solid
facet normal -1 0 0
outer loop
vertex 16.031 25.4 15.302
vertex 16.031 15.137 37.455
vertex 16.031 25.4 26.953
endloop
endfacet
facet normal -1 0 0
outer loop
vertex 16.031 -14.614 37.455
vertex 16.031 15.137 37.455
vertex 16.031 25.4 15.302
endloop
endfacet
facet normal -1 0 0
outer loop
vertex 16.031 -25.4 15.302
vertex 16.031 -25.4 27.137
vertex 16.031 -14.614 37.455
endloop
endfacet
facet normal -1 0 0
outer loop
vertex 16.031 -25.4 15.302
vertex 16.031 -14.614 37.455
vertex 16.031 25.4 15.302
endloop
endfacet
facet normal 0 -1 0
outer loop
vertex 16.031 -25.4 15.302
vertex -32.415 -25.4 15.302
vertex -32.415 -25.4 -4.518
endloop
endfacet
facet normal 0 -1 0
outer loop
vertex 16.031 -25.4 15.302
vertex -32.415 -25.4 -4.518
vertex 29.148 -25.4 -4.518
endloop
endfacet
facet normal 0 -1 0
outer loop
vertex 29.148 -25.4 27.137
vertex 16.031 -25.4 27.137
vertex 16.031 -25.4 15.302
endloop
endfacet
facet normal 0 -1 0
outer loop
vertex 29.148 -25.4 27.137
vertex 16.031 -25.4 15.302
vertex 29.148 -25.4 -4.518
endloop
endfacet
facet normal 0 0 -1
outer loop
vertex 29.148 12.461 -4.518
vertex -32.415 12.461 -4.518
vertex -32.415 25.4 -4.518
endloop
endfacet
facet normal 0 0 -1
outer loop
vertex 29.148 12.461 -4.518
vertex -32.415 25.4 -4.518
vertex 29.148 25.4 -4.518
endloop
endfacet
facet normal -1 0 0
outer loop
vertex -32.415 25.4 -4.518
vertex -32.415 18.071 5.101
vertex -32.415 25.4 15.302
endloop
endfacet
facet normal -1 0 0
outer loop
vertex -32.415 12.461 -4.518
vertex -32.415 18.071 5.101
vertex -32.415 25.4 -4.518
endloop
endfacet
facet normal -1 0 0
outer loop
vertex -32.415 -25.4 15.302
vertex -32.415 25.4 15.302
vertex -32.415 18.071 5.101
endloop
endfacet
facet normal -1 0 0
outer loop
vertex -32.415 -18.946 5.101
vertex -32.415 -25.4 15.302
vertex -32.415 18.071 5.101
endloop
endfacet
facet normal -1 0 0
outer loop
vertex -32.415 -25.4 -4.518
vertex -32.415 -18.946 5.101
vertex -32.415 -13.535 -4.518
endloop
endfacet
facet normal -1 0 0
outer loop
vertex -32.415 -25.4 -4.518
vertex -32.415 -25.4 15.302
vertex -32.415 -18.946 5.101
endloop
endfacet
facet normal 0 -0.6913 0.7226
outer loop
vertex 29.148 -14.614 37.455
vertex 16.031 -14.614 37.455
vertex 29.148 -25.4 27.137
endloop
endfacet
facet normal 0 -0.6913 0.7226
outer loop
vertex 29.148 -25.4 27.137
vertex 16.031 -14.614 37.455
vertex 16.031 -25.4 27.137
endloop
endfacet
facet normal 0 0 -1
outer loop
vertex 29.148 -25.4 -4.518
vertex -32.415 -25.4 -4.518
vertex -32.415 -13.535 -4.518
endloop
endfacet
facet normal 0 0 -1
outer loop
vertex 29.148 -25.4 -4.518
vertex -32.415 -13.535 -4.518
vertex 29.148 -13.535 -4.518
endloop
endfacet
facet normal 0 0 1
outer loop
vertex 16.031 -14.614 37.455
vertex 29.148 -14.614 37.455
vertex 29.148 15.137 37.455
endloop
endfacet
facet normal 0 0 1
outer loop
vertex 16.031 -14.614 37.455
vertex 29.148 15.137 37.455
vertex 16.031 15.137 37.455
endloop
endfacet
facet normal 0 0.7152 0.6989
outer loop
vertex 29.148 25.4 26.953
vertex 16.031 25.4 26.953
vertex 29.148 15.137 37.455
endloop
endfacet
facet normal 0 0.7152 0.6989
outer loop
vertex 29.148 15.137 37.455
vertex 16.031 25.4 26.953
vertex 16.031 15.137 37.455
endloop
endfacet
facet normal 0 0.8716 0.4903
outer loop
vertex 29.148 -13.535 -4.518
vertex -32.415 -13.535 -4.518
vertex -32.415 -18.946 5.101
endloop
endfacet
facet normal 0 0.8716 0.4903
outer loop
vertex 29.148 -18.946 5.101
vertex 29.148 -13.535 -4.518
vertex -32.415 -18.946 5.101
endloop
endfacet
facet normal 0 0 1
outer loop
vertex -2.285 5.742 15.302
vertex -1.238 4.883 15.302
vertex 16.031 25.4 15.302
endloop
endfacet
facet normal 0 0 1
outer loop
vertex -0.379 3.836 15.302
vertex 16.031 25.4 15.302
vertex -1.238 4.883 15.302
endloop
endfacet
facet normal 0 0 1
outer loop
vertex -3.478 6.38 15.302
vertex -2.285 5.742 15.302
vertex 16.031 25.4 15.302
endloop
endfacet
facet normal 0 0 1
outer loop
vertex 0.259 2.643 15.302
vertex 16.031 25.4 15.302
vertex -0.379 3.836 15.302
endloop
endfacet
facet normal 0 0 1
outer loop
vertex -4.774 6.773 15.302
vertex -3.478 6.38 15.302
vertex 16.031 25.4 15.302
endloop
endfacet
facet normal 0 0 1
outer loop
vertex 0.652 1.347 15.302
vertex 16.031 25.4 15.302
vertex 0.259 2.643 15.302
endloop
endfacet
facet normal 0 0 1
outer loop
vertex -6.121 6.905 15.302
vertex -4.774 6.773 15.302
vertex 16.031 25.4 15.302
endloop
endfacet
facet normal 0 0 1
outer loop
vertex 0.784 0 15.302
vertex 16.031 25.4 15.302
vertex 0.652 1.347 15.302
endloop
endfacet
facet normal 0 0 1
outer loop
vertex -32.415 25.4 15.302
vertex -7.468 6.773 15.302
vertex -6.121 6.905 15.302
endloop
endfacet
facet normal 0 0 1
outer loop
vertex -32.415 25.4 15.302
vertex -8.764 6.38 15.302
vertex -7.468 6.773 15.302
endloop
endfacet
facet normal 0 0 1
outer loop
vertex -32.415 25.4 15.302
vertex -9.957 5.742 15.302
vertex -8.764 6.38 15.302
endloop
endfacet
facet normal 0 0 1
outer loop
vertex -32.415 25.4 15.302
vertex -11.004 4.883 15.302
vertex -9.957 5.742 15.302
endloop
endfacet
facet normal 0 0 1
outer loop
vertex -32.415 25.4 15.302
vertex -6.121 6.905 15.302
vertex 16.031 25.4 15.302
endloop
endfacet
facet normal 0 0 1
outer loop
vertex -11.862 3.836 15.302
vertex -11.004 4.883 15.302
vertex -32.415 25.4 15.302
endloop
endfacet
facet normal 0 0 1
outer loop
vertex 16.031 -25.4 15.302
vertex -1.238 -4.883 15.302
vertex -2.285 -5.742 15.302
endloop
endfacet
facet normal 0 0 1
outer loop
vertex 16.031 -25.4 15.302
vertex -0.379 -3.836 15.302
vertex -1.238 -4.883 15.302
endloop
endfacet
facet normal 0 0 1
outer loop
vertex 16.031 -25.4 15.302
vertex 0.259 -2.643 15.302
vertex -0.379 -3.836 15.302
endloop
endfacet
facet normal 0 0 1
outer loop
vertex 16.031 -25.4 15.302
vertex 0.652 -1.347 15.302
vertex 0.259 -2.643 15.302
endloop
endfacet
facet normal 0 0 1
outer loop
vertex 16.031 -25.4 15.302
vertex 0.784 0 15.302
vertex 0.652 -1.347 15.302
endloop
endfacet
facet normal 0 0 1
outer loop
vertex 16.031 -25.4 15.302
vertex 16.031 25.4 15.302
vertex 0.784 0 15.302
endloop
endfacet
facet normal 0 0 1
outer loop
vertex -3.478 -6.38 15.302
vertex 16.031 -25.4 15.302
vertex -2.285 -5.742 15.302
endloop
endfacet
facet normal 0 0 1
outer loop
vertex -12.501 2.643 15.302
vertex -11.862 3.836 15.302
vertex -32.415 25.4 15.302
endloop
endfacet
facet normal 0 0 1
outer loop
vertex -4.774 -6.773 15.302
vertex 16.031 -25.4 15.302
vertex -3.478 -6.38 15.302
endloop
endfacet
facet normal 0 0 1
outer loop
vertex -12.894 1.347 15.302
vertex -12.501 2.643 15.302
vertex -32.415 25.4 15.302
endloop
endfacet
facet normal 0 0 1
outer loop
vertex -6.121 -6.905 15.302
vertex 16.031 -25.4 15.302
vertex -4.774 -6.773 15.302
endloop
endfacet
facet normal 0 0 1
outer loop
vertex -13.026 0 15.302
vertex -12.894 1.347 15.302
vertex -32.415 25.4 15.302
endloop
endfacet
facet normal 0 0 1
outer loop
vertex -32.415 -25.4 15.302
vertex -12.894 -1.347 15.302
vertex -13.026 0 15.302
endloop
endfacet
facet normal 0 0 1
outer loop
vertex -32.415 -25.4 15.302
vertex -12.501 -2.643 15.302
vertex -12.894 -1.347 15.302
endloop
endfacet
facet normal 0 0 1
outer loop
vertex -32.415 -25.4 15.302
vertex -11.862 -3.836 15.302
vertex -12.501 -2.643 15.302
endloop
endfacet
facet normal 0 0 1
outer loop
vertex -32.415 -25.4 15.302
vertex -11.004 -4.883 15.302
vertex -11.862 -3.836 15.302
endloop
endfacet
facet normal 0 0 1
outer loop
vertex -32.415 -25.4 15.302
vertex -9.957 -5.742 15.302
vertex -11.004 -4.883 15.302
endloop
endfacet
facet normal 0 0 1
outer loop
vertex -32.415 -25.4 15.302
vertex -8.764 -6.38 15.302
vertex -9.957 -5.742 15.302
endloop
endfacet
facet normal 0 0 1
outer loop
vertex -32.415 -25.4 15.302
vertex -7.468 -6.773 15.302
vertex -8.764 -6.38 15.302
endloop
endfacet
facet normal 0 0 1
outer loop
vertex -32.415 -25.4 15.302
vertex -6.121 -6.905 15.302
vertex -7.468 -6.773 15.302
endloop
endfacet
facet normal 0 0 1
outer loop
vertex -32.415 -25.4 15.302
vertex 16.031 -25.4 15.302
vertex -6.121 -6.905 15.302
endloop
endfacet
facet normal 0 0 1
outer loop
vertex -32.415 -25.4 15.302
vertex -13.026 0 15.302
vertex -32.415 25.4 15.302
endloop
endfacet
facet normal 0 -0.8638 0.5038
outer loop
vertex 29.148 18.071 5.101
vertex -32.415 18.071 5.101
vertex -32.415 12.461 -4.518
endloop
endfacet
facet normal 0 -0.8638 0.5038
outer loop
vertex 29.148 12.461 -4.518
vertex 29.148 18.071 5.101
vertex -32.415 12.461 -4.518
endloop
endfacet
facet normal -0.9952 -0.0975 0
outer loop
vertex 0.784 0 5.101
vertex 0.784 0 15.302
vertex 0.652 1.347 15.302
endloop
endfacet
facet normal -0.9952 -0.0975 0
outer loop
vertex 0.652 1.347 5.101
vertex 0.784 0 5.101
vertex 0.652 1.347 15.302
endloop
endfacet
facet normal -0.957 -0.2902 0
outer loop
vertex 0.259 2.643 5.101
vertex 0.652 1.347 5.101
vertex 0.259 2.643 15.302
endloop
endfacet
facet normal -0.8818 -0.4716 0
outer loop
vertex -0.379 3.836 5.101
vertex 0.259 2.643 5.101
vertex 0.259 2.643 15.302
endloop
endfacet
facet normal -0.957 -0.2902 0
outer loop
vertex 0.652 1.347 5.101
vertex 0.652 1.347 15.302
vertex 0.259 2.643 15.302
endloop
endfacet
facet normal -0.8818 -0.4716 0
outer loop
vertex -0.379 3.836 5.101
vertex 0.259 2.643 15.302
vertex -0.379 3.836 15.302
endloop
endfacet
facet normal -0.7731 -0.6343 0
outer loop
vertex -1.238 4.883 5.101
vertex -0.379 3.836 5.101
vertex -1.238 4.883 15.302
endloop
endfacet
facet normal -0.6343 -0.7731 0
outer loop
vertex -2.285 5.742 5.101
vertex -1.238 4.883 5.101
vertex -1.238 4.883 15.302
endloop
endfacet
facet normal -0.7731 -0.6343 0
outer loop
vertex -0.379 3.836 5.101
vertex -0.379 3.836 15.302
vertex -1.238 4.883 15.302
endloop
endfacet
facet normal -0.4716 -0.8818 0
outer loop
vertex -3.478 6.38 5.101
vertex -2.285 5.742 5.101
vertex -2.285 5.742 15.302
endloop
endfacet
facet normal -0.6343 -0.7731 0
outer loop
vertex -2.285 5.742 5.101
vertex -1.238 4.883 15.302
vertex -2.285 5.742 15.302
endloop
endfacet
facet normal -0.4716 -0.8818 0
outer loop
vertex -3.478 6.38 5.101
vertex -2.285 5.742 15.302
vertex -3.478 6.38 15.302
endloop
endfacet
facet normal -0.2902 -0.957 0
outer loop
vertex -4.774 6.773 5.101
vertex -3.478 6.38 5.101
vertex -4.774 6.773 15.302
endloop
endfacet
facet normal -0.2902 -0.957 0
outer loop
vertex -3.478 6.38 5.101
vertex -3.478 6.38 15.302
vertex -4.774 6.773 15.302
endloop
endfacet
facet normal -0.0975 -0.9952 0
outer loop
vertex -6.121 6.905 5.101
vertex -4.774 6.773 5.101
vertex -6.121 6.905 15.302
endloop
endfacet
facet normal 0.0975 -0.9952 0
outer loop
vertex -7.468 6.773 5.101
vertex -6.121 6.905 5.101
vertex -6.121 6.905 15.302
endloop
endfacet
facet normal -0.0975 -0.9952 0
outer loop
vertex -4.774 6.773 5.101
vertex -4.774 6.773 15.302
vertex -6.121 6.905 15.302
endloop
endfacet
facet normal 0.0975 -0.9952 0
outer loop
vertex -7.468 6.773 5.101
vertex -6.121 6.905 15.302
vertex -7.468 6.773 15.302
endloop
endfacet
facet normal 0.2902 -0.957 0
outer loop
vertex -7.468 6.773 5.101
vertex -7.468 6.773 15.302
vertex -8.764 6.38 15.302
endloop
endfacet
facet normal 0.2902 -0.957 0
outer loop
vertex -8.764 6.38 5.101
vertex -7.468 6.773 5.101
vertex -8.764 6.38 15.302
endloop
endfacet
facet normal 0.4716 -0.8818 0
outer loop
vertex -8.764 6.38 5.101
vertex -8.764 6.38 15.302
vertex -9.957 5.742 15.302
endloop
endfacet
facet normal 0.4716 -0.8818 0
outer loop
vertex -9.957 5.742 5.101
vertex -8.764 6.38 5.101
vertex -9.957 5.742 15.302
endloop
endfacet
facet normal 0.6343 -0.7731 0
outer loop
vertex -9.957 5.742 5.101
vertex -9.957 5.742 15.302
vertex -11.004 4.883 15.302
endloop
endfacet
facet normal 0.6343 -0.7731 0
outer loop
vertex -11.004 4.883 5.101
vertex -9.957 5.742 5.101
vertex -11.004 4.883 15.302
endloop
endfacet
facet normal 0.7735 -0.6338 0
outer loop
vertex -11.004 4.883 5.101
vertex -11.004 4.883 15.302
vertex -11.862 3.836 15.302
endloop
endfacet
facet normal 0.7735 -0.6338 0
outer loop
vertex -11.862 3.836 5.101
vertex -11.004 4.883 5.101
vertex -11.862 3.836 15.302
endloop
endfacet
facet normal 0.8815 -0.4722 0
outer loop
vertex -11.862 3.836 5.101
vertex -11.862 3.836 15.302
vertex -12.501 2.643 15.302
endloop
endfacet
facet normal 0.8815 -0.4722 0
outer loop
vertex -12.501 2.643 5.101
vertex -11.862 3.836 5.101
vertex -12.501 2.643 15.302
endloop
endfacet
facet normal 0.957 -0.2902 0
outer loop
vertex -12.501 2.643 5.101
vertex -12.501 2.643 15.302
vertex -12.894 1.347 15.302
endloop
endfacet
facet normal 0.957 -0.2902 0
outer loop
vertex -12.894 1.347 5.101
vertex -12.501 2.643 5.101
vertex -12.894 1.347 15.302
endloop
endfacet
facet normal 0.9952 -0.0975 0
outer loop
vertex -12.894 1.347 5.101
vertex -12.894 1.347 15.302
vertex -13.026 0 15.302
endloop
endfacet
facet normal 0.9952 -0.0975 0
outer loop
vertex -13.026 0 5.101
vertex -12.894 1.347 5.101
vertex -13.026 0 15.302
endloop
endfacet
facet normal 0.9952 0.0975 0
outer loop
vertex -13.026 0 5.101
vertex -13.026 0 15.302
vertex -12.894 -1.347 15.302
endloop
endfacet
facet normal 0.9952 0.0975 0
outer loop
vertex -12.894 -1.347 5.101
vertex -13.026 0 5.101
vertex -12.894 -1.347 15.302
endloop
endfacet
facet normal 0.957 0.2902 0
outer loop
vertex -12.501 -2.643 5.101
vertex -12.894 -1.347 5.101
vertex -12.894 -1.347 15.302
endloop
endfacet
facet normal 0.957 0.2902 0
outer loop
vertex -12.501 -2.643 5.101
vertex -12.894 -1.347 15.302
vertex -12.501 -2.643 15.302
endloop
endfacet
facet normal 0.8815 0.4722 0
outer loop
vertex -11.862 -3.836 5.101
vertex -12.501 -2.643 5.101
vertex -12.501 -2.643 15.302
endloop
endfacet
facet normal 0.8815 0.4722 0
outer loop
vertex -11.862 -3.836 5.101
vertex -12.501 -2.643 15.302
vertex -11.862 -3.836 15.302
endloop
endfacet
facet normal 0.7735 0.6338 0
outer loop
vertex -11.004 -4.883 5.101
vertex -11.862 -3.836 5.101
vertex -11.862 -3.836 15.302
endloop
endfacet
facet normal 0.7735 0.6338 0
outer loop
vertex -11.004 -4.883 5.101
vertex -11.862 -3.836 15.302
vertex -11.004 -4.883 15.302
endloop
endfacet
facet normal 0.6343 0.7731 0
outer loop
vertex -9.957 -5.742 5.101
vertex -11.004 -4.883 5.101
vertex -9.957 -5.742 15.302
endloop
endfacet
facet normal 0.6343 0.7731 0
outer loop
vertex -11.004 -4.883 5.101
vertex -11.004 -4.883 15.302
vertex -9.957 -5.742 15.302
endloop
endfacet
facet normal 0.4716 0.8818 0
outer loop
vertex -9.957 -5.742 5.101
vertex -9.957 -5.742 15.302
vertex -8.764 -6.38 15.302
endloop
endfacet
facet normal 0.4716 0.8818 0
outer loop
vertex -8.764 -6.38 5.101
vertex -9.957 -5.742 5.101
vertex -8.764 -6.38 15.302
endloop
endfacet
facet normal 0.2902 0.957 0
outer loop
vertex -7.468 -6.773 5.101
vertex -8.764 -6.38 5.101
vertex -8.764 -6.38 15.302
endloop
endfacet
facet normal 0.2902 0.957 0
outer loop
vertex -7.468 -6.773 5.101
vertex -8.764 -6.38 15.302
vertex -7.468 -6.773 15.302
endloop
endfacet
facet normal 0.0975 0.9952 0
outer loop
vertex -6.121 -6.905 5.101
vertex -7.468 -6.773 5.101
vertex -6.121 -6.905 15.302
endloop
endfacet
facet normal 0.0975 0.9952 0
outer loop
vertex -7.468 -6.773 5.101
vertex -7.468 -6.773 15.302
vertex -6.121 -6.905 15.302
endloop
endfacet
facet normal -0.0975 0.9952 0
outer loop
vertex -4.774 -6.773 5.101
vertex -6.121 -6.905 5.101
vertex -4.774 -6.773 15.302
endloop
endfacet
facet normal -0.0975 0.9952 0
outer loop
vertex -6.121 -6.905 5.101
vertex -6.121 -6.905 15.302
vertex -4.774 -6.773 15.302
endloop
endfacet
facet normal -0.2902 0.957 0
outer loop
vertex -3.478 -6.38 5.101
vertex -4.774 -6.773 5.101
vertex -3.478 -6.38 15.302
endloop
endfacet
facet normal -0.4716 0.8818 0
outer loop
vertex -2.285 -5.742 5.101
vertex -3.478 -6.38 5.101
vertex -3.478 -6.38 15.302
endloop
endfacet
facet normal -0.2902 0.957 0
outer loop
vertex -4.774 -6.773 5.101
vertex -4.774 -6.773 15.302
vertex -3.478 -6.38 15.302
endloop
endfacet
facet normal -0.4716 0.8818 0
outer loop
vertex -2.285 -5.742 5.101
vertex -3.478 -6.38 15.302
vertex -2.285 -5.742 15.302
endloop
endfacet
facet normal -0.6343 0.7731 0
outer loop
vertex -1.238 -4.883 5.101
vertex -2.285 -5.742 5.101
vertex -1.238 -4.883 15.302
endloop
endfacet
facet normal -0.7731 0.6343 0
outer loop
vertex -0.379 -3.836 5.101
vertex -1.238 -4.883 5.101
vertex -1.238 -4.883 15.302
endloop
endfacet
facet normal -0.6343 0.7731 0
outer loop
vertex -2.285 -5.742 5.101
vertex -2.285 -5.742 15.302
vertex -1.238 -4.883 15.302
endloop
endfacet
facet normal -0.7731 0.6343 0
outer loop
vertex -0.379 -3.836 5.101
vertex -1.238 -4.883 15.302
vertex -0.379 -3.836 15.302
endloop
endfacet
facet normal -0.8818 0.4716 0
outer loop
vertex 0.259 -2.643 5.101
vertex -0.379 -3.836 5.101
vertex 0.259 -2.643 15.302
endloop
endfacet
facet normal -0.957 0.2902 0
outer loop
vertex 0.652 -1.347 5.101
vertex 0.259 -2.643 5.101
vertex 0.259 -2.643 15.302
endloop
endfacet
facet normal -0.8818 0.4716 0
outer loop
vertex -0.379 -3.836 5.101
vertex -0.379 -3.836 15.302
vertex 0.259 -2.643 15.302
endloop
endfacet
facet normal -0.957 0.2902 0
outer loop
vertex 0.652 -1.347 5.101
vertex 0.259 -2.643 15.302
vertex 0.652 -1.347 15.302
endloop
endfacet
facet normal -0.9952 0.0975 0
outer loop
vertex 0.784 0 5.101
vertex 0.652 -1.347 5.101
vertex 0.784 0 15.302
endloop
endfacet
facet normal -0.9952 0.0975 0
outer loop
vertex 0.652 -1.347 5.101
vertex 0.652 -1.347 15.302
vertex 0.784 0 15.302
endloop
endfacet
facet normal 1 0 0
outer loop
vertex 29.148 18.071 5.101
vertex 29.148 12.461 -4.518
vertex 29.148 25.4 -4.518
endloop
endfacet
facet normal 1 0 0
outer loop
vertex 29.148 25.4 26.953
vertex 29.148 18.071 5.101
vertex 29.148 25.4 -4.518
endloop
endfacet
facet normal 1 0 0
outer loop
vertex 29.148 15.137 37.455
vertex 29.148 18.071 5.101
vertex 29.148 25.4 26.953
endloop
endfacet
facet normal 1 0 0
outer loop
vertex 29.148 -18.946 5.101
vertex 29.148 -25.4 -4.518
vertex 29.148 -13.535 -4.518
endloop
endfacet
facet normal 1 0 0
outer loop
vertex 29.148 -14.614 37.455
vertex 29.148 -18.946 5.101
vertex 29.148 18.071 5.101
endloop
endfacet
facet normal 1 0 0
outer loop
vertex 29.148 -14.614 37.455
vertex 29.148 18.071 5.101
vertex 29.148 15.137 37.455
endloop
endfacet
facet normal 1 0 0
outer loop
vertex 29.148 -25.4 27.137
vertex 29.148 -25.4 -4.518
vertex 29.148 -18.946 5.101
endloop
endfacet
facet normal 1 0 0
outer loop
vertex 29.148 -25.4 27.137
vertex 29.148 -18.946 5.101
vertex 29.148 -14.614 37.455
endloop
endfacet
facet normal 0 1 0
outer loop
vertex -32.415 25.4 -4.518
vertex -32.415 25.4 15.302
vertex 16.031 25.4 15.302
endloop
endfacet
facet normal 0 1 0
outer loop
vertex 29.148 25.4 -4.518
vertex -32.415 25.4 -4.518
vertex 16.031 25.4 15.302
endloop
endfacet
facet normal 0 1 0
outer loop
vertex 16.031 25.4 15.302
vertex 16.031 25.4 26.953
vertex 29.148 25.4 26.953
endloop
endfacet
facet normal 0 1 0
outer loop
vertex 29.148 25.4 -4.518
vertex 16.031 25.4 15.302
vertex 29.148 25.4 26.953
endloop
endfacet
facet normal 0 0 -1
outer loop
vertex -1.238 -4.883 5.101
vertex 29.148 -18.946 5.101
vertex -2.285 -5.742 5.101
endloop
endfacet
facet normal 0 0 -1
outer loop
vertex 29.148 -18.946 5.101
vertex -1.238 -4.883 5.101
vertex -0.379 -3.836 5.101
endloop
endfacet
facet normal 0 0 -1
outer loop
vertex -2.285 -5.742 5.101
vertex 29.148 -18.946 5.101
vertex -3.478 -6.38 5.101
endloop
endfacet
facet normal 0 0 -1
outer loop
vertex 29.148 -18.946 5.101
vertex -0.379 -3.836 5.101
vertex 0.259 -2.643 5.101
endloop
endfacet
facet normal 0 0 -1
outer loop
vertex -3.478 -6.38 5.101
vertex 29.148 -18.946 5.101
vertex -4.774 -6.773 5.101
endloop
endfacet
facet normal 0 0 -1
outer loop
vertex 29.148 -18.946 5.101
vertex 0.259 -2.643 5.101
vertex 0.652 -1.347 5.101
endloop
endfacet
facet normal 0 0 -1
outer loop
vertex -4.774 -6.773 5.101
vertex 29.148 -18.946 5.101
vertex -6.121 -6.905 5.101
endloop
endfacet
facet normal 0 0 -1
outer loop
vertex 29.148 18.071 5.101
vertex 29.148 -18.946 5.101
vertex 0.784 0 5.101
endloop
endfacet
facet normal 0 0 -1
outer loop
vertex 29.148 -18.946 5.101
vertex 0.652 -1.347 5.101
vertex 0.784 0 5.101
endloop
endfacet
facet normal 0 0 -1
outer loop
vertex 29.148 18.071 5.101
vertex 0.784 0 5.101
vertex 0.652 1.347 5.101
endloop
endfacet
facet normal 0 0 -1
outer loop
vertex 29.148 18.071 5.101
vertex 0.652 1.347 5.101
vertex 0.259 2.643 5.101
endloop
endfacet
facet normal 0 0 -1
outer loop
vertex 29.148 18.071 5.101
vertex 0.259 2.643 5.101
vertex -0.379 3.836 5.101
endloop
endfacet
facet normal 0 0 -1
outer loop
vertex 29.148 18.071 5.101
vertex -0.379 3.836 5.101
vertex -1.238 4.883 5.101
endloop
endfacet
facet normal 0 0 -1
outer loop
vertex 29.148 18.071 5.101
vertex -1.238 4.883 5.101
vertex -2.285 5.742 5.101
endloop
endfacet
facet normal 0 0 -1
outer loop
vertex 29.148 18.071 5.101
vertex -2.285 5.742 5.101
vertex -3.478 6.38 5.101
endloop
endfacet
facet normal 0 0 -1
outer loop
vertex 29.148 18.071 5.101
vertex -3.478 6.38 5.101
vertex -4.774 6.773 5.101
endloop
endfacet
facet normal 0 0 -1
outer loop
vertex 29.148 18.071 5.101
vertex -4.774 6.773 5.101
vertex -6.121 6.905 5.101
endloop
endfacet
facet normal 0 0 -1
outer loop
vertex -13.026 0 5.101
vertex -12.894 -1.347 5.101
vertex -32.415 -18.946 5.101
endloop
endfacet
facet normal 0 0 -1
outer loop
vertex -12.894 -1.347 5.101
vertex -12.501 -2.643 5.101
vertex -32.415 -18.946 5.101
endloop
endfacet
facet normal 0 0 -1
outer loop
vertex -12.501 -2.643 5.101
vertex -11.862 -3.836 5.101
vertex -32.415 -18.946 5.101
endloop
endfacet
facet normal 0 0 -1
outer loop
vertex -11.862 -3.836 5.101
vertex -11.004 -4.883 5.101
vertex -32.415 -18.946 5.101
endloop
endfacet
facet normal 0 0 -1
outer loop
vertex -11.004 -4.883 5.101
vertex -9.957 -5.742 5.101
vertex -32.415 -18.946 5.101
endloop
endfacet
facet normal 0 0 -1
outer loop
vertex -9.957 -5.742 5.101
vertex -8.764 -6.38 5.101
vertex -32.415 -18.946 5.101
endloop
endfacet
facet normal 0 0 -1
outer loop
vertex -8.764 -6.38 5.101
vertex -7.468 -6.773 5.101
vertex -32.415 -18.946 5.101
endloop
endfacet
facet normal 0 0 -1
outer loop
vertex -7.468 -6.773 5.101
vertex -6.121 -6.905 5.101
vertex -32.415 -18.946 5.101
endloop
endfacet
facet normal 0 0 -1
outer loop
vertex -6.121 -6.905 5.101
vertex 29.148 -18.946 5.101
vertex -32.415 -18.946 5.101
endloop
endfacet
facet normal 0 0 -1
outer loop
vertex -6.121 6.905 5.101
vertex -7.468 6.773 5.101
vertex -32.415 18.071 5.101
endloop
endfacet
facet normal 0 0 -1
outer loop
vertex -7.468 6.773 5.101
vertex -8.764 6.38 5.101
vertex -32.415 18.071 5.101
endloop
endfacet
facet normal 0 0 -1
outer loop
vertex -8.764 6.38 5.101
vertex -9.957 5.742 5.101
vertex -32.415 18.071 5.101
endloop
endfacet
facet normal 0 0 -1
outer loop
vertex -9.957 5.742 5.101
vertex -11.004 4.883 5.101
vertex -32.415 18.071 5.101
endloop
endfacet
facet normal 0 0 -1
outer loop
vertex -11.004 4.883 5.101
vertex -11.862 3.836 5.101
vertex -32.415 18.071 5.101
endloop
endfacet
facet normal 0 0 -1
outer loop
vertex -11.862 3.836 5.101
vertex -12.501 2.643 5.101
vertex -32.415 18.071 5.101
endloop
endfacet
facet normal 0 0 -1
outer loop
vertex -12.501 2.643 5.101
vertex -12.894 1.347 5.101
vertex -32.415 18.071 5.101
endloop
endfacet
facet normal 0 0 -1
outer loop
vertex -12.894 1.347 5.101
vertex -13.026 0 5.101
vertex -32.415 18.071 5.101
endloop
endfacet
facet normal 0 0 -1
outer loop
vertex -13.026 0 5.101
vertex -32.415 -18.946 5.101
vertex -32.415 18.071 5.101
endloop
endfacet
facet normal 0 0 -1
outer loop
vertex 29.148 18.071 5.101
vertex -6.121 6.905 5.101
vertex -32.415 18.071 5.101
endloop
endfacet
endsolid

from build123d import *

# Parameters (mm, degrees)
F1_DEPTH      = 25.4
F1_DEPTH_BACK = 25.4
F3_DEPTH      = 25.4
F5_DEPTH      = 108.204
F6_R          = 6.9052604412
F7_DEPTH      = 25.4


with BuildPart() as f1:
    # F0 (on Front) → F1 (new body, two sides)
    with BuildSketch(Plane.XZ) as f1_sk:
        Polygon((16.0311479121, 15.3024597093), (-32.4148759246, 15.3024597093), (-32.4148759246, -4.5178690925), (29.1475392878, -4.5178690925), (29.1475392878, 37.4545902014), (16.0311479121, 37.4545902014), align=None)
    extrude(amount=F1_DEPTH)
    extrude(f1_sk.sketch, amount=-F1_DEPTH_BACK)

    # F2 (on face) → F3 (cut)
    with BuildSketch(Plane(origin=(16.0311479121, 0, 0), x_dir=(0, -1, 0), z_dir=(-1, 0, 0))):
        Polygon((-25.4, 26.9527581858), (-15.1368464701, 37.4545902014), (-25.4, 37.4545902014), align=None)
        Polygon((25.4, 37.4545902014), (14.6135179795, 37.4545902014), (25.4, 27.1370837055), align=None)
    extrude(amount=-F3_DEPTH, mode=Mode.SUBTRACT)

    # F4 (on face) → F5 (cut)
    with BuildSketch(Plane(origin=(-32.4148759246, 0, 0), x_dir=(0, -1, 0), z_dir=(-1, 0, 0))):
        Polygon((13.535389653, -4.5178690925), (18.945902586, 5.1008197479), (-18.0714763701, 5.1008197479), (-12.4605736661, -4.5178690925), align=None)
    extrude(amount=-F5_DEPTH, mode=Mode.SUBTRACT)

    # F6 (on face) → F7 (cut)
    with BuildSketch(Plane.XY.offset(15.3024597093)):
        with Locations((-6.1209849082, 0)):
            Circle(F6_R)
    extrude(amount=-F7_DEPTH, mode=Mode.SUBTRACT)


solid = f1.part
